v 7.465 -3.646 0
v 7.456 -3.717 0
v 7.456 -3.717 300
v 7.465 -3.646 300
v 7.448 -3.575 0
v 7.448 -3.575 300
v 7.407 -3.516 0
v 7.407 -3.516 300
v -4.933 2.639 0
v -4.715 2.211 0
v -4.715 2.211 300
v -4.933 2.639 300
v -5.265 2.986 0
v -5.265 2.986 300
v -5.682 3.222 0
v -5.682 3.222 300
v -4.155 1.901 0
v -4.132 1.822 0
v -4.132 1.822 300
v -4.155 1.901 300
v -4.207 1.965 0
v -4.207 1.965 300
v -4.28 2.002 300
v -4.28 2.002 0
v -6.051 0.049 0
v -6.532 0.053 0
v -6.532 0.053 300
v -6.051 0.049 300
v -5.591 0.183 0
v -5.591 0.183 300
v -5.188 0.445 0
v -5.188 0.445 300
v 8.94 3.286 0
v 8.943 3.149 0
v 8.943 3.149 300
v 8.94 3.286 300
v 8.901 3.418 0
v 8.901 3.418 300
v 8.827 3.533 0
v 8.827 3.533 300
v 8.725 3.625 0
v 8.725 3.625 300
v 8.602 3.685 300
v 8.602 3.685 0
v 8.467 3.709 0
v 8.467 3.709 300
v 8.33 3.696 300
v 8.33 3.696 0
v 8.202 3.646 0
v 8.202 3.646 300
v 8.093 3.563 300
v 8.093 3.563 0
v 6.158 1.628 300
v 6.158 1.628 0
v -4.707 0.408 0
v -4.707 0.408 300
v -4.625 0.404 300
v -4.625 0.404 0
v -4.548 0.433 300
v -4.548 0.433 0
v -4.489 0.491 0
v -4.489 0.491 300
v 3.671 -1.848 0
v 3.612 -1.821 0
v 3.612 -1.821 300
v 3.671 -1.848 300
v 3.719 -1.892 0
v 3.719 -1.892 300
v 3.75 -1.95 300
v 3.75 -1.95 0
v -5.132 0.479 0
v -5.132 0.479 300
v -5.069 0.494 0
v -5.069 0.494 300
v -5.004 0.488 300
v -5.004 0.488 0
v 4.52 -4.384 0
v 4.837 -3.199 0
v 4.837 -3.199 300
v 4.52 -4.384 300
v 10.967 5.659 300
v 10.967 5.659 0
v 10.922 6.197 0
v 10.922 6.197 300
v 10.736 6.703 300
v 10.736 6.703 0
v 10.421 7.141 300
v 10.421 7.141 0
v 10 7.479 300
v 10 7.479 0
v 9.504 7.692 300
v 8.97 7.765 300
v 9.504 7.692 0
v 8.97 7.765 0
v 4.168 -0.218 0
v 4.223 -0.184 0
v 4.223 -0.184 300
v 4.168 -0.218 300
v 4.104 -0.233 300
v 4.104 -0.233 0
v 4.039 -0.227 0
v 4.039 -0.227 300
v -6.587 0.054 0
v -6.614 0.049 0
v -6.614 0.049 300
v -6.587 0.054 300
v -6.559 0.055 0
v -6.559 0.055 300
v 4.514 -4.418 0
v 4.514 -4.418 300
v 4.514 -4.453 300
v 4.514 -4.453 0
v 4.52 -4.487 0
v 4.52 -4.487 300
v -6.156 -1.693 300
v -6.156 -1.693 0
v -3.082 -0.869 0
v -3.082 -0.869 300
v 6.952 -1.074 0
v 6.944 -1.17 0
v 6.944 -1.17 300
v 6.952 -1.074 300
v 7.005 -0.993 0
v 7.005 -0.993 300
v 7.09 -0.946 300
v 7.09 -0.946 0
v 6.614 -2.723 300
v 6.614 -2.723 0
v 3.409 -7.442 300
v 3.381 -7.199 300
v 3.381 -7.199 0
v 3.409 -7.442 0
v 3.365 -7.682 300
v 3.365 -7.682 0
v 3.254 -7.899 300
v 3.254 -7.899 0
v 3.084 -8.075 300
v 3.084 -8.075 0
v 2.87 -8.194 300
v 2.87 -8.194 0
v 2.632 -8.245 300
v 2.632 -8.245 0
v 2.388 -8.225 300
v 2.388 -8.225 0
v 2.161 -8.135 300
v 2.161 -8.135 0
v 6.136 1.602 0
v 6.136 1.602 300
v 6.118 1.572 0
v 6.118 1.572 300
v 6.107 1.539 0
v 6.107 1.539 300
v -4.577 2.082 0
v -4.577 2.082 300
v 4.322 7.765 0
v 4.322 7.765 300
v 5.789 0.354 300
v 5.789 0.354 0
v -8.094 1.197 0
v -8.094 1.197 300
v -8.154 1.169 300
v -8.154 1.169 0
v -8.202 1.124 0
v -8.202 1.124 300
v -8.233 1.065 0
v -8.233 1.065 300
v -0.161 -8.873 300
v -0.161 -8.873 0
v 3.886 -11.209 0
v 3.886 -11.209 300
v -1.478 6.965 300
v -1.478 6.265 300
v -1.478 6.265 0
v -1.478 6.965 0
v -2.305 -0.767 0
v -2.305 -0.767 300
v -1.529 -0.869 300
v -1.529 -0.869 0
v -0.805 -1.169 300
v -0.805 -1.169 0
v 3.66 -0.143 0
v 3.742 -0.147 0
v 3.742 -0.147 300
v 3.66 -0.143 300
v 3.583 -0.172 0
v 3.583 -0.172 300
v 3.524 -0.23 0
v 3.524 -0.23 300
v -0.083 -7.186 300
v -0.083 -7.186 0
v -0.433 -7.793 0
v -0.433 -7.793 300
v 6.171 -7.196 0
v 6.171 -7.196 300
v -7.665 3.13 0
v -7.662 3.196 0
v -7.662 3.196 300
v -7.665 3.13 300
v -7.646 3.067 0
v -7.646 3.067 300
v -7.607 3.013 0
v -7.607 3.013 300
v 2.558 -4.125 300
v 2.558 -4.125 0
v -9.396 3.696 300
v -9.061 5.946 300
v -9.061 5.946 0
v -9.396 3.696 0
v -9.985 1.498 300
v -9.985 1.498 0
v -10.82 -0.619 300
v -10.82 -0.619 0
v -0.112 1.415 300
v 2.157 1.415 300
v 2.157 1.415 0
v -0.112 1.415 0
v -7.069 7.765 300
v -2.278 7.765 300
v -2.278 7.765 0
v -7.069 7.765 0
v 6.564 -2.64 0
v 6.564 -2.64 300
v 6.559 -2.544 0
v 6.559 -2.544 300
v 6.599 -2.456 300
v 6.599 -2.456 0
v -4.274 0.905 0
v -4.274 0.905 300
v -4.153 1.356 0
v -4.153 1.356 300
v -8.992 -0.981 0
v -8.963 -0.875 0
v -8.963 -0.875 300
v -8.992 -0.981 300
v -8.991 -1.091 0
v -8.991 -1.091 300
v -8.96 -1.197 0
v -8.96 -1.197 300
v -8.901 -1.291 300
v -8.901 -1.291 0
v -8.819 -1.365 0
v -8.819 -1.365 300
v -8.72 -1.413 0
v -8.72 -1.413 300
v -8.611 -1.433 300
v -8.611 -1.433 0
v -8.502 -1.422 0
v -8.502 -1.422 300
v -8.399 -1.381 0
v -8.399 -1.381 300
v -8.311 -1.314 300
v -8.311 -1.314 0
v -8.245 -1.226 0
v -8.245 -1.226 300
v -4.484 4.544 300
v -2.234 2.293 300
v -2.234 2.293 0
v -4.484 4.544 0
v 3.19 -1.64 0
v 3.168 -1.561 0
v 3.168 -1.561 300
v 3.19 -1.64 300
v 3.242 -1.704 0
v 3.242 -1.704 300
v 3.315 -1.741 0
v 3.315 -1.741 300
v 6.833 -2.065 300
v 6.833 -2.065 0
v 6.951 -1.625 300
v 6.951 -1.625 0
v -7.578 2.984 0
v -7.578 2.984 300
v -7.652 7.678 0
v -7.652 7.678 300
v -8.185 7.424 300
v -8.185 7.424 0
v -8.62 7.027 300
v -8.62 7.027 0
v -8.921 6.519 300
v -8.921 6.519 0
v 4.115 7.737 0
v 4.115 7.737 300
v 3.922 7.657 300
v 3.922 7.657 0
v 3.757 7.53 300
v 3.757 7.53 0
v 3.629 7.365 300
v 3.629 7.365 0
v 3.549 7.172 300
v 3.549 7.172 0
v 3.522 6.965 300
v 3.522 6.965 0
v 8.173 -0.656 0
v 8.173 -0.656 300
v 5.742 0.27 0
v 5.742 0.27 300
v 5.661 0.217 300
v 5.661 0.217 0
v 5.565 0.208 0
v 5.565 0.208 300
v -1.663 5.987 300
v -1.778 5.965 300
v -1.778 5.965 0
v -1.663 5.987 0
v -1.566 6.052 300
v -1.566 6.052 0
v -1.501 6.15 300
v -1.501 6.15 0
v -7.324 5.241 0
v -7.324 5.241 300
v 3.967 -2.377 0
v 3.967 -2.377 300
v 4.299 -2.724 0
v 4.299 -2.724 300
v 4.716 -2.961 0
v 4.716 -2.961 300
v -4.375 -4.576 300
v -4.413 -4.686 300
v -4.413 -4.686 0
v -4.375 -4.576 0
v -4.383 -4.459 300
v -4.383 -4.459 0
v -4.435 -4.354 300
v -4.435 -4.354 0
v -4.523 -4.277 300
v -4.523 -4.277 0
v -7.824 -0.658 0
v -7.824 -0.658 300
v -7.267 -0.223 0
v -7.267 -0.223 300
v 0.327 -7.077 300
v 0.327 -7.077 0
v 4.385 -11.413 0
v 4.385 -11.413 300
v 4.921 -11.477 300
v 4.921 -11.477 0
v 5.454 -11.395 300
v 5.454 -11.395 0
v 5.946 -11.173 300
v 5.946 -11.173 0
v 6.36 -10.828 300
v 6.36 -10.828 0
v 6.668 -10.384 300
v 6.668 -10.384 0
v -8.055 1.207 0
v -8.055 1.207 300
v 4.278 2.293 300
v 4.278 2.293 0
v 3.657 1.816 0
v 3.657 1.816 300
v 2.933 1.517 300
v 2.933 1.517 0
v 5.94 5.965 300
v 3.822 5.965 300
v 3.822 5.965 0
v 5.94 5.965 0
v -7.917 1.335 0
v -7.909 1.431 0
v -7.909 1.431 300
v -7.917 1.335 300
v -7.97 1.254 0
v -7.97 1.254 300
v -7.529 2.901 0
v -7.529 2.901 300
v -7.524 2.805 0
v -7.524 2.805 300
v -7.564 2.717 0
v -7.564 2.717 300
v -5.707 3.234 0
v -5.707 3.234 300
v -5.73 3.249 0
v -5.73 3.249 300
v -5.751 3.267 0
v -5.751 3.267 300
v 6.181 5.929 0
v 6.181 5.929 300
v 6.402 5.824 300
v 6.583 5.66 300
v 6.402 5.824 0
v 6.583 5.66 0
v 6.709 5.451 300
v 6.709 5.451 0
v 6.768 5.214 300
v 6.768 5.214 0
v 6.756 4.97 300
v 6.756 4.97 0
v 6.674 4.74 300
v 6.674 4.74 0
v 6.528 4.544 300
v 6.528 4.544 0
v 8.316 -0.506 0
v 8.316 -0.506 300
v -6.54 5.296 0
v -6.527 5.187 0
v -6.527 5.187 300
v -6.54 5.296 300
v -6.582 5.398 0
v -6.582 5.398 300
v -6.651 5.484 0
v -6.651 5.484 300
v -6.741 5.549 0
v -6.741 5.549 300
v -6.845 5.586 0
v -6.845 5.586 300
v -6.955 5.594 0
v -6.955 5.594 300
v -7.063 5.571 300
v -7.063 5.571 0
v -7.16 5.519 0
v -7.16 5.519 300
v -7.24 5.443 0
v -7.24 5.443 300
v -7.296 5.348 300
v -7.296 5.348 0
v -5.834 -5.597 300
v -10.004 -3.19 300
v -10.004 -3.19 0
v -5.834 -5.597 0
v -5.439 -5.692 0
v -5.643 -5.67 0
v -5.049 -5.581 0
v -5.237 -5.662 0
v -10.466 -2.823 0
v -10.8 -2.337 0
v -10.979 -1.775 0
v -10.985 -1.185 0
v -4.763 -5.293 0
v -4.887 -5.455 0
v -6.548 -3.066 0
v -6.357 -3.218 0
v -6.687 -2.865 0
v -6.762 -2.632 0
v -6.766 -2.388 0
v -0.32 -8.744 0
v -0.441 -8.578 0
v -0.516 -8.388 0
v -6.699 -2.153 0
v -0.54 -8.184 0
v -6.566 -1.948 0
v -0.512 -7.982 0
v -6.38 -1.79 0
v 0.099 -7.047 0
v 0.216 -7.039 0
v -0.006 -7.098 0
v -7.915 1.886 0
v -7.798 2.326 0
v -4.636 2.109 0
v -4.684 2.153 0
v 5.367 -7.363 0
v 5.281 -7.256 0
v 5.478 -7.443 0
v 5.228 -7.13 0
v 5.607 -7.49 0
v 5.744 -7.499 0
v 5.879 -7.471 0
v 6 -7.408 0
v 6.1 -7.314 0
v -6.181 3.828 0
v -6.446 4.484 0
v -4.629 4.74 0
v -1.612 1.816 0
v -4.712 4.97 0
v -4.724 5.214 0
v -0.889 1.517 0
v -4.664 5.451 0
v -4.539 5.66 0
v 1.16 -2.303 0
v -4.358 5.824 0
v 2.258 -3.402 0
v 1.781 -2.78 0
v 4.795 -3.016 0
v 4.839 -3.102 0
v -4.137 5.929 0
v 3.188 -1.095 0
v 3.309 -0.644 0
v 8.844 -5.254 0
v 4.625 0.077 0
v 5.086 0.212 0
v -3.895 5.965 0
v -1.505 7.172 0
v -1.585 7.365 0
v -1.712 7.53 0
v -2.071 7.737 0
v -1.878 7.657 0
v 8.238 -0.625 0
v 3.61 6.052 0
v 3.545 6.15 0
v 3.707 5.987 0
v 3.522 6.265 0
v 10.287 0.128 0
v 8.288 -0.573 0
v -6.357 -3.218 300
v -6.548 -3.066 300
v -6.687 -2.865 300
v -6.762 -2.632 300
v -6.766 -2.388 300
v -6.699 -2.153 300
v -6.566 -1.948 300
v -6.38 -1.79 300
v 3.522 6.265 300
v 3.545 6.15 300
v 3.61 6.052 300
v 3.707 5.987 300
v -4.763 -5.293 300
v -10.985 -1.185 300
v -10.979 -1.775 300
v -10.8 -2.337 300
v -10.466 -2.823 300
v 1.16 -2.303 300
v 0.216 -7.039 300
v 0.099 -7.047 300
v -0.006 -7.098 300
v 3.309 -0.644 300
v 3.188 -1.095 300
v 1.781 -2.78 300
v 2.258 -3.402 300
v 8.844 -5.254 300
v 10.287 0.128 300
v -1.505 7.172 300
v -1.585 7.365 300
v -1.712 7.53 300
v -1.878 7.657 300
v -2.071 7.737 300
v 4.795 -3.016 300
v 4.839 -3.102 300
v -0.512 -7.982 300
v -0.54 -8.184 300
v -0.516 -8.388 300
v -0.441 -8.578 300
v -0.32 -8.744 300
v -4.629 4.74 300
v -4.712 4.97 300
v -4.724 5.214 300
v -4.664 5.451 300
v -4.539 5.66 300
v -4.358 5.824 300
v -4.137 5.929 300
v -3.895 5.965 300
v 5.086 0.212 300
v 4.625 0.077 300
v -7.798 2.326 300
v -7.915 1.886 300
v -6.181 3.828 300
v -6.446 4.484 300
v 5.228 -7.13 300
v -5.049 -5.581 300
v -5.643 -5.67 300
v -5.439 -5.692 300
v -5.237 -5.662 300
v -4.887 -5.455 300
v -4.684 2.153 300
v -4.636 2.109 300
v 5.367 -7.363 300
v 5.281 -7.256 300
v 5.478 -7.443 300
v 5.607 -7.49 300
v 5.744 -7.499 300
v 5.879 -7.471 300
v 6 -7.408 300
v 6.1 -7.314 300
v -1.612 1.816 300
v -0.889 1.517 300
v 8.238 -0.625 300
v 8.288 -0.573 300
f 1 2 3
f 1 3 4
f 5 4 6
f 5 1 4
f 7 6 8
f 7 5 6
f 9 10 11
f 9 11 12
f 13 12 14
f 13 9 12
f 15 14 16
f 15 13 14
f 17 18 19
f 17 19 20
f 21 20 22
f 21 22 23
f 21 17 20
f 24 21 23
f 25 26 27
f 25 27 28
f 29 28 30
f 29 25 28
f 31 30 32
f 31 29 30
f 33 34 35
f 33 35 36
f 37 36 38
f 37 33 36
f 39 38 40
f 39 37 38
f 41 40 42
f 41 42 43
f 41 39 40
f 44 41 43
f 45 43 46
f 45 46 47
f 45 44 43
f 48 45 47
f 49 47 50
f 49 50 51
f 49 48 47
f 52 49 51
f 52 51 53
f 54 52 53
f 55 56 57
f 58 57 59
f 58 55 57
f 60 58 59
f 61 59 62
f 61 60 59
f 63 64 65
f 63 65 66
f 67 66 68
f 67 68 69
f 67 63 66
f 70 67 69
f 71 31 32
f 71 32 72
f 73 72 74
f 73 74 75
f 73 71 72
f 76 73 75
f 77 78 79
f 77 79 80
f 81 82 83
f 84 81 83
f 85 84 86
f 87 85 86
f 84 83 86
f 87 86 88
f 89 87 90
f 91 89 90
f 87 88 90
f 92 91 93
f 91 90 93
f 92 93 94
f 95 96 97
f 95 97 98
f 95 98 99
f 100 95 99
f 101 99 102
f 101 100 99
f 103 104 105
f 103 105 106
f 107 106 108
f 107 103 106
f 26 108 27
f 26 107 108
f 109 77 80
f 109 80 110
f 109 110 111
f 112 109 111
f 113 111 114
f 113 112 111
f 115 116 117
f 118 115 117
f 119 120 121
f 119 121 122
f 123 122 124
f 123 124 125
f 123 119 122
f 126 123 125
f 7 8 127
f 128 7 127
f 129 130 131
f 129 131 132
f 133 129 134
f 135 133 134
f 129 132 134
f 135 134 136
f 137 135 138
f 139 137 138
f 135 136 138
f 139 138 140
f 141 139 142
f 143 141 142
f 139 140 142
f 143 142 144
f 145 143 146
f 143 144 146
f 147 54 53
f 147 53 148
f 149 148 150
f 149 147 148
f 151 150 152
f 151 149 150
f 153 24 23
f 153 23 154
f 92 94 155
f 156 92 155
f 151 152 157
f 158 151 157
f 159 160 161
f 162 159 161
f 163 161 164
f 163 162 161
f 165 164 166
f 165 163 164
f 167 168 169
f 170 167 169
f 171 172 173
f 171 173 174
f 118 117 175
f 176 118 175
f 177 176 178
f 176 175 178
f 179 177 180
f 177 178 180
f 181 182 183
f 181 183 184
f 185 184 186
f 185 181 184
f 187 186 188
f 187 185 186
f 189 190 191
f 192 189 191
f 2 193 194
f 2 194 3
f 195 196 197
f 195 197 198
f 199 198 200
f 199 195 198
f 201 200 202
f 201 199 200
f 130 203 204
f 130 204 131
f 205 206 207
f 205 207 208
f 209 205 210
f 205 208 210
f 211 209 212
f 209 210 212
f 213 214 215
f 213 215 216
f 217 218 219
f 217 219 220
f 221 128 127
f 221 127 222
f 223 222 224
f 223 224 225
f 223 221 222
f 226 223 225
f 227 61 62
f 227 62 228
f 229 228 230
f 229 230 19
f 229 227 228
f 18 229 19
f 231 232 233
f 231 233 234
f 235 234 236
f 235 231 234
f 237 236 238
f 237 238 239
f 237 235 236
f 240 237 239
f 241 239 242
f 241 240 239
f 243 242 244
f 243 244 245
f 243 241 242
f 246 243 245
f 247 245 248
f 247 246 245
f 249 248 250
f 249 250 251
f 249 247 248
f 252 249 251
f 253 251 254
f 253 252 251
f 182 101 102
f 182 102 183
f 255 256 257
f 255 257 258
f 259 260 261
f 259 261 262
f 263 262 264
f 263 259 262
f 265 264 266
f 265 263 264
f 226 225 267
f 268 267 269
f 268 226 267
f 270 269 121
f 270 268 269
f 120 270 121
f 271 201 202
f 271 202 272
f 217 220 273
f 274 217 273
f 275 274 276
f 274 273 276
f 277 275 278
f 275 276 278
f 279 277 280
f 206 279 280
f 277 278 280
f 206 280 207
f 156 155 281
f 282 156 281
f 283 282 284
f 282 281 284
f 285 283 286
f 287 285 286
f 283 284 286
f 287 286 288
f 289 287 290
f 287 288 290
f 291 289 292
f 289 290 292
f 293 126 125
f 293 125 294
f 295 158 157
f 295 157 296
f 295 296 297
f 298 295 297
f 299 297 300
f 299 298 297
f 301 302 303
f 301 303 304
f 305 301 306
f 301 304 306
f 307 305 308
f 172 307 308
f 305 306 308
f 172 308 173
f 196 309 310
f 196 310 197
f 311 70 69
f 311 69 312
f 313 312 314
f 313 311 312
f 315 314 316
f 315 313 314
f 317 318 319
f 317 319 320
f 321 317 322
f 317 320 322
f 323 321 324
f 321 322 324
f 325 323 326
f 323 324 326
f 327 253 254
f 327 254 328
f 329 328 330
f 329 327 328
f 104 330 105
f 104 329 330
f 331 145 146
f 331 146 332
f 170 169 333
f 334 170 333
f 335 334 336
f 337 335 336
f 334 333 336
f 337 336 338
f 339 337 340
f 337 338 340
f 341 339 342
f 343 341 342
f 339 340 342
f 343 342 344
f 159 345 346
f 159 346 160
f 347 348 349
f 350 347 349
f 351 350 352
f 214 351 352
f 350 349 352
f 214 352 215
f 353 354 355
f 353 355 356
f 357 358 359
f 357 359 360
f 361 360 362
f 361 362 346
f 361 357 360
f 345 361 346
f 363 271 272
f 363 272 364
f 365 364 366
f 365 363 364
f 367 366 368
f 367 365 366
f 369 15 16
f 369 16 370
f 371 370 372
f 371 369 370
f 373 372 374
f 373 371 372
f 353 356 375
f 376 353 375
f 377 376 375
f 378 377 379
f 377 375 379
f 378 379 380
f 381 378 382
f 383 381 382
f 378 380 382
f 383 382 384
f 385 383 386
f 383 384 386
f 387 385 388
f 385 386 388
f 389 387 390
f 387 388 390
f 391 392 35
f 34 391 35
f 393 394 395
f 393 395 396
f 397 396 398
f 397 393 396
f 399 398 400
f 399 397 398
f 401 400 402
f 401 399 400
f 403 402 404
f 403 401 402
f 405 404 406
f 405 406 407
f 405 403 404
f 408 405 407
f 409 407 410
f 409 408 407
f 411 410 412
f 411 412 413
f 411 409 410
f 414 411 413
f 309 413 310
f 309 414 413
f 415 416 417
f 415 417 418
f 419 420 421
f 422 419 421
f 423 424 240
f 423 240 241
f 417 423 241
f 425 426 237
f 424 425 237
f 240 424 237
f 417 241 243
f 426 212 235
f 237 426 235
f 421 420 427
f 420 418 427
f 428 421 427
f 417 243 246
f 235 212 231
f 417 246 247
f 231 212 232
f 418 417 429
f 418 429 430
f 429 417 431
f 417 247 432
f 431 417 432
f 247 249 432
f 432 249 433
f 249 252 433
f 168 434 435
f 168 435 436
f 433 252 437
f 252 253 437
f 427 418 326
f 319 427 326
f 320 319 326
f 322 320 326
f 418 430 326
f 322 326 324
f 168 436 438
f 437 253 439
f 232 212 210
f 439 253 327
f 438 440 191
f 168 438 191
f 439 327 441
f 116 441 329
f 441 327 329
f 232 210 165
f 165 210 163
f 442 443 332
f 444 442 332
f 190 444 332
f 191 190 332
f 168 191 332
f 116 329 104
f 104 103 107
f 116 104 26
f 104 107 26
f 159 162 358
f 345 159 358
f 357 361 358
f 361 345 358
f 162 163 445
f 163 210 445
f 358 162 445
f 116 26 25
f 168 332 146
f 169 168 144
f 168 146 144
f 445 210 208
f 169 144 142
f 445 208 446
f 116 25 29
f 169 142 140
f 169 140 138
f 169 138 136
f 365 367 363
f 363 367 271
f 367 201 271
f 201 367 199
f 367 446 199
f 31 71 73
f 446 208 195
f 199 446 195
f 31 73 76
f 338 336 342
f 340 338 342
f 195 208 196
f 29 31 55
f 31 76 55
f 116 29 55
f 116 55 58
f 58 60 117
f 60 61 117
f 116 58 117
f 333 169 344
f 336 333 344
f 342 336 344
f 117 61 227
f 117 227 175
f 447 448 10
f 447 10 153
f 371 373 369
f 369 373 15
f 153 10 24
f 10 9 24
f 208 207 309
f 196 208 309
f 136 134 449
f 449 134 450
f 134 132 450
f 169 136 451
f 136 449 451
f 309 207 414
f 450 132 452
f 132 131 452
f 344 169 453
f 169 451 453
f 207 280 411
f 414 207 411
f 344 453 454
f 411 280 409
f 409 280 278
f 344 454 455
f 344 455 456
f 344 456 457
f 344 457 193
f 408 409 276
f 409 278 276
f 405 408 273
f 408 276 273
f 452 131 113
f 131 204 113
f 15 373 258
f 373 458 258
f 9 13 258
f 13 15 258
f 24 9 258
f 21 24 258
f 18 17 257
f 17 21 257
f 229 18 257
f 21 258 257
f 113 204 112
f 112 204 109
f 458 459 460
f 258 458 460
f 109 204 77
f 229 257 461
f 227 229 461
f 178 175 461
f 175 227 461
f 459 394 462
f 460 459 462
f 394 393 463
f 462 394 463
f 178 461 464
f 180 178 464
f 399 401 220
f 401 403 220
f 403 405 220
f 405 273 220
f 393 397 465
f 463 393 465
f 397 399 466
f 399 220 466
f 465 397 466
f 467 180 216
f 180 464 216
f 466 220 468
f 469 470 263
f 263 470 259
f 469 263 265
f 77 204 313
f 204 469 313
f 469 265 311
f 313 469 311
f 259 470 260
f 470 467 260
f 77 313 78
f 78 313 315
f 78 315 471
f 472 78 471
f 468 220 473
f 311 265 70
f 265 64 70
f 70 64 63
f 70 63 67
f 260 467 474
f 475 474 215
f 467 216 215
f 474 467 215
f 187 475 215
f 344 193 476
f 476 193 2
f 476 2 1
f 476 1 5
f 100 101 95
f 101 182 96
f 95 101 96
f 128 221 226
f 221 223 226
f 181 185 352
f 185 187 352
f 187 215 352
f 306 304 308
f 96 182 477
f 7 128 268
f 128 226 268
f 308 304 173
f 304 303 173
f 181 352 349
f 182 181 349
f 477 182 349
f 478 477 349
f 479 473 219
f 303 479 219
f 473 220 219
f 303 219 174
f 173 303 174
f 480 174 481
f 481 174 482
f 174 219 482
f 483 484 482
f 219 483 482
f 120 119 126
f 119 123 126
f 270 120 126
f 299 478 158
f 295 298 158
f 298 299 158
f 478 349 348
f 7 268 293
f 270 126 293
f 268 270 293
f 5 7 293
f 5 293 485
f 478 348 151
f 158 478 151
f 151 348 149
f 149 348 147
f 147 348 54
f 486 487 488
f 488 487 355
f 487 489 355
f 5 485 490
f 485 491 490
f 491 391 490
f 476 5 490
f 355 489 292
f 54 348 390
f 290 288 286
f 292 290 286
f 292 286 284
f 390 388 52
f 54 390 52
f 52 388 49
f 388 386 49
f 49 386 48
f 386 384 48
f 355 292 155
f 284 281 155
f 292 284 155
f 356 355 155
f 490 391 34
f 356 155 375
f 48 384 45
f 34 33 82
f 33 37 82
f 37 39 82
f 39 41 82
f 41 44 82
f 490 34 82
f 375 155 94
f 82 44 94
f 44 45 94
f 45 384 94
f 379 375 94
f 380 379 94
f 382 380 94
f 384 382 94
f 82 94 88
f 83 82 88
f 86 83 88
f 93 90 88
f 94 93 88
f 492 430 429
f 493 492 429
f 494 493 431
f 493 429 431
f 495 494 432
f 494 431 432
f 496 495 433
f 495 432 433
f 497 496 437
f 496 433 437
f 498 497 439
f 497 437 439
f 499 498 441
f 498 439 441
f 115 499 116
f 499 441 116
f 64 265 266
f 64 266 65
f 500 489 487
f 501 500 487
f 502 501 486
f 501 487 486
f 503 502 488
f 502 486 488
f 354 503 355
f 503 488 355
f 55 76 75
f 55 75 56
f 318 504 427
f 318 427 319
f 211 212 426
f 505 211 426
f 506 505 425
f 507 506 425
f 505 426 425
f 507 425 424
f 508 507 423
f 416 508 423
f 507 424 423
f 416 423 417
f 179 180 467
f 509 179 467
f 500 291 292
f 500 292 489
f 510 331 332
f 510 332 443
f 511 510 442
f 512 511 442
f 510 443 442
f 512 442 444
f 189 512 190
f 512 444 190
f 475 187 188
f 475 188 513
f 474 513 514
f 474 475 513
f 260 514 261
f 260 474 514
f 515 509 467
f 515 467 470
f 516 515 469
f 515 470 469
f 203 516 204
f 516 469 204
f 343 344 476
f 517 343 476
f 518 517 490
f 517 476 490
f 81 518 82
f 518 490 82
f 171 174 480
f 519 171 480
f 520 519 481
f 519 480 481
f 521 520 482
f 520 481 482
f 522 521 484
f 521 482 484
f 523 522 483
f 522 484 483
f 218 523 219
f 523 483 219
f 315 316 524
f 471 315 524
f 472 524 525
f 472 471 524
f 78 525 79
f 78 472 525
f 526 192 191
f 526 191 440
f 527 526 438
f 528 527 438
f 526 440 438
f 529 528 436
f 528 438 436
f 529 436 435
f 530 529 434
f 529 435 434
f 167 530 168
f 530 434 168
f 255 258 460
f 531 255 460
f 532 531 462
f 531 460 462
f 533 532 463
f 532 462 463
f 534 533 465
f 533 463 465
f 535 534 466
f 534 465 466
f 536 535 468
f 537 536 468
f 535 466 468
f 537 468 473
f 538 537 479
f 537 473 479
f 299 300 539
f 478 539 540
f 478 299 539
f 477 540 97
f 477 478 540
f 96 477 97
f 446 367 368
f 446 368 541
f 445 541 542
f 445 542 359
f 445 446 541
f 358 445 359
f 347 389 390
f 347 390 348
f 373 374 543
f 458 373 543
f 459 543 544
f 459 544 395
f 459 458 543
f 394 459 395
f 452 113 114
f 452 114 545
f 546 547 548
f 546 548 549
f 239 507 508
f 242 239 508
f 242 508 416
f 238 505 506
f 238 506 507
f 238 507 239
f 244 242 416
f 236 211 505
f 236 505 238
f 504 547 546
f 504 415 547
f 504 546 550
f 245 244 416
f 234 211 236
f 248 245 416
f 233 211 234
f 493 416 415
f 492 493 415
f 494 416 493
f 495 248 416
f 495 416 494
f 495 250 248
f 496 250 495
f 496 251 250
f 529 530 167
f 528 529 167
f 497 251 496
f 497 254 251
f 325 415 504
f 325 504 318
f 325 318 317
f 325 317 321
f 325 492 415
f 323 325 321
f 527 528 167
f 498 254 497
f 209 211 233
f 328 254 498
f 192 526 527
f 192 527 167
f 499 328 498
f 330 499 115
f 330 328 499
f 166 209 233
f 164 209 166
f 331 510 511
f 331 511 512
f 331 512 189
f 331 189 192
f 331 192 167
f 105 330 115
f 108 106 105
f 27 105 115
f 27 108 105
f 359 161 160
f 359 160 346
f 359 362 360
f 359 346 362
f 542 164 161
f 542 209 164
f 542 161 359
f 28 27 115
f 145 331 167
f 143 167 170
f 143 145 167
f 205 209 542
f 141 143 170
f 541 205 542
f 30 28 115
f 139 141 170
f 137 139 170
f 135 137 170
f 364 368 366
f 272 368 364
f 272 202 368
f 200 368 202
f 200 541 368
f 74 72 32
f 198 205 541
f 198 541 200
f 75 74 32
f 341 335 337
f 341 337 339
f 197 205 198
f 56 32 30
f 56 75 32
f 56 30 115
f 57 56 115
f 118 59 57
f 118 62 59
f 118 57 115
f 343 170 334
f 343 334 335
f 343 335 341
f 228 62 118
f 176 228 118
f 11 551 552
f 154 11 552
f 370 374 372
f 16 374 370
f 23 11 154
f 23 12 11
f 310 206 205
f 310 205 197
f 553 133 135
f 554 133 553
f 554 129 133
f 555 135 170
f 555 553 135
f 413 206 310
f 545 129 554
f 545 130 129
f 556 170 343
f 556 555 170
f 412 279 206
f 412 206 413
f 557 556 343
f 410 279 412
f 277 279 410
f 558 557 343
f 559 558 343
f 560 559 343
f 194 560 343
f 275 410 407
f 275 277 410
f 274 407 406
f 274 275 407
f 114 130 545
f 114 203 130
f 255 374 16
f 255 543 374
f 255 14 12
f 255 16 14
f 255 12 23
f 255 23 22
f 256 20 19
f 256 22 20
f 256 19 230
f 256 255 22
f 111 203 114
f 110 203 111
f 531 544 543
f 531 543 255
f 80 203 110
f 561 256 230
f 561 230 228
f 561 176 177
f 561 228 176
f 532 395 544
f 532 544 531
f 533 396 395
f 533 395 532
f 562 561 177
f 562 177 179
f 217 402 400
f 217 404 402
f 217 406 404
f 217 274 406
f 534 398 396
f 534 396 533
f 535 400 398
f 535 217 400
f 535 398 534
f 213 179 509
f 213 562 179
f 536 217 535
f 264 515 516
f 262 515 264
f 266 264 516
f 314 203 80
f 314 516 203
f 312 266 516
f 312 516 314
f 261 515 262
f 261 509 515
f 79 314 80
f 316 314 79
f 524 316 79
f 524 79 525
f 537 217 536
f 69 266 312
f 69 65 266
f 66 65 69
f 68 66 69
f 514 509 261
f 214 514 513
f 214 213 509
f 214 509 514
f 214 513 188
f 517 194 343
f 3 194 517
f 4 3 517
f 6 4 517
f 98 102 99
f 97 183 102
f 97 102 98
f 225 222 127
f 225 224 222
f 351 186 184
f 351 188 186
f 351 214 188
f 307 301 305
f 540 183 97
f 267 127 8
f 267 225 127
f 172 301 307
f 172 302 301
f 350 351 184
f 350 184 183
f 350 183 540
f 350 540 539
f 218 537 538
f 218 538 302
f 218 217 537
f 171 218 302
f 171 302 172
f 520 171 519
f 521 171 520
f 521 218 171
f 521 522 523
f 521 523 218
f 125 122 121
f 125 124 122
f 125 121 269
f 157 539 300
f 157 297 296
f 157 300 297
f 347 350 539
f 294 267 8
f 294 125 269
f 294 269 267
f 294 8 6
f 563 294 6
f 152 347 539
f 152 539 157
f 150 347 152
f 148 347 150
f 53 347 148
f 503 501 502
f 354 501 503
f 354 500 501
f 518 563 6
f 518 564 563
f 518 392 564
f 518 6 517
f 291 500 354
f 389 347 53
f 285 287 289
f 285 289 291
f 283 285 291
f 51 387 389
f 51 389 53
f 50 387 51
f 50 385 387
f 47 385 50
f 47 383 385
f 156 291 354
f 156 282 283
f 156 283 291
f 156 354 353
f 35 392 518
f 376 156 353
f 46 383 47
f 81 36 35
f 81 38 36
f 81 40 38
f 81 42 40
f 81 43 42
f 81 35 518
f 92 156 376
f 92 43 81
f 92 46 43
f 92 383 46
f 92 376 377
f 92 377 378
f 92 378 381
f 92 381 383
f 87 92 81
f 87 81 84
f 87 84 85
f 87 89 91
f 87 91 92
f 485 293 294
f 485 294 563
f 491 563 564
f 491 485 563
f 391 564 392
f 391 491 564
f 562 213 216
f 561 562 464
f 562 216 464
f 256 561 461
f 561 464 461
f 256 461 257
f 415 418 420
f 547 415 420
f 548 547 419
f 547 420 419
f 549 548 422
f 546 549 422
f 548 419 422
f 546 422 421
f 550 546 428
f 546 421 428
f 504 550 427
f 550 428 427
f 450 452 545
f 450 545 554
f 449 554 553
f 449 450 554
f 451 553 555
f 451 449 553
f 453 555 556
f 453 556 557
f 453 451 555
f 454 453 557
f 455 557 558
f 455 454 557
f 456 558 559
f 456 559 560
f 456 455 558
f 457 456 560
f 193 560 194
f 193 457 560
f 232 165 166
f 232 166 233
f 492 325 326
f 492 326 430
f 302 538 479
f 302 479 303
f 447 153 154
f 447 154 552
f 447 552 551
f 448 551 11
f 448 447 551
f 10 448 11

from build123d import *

# Parameters (mm, degrees)
BOSS_EXTRU_1_DEPTH = 300


with BuildPart() as part:
    # Esquisse1 → Boss.-Extru.1 (new body)
    with BuildSketch(Plane.XY):
        with BuildLine():
            Line((-2.277781394, 7.764570671), (-7.068879094, 7.764570671))
            ThreePointArc((-7.068879094, 7.764570671), (-8.417278819, 7.241668562), (-9.060597485, 5.946388851))
            ThreePointArc((-9.060597485, 5.946388851), (-9.659264868, 2.58818977), (-10.819903246, -0.619429637))
            ThreePointArc((-10.819903246, -0.619429637), (-10.910412794, -2.062834106), (-10.00411543, -3.18988048))
            Line((-10.00411543, -3.18988048), (-5.834093414, -5.597443814))
            ThreePointArc((-5.834093414, -5.597443814), (-5.236709364, -5.662062276), (-4.7628449, -5.292609007))
            Line((-4.7628449, -5.292609007), (-4.412844891, -4.68639123))
            ThreePointArc((-4.412844891, -4.68639123), (-4.382874764, -4.458745516), (-4.522652512, -4.276583608))
            Line((-4.522652512, -4.276583608), (-6.356537861, -3.217789408))
            ThreePointArc((-6.356537861, -3.217789408), (-6.765622267, -2.388248296), (-6.155776036, -1.692851946))
            Line((-6.155776036, -1.692851946), (-3.081802459, -0.869183204))
            ThreePointArc((-3.081802459, -0.869183204), (-1.913766747, -0.792626099), (-0.805345324, -1.168884471))
            Line((-0.805345324, -1.168884471), (1.159782546, -2.303451576))
            ThreePointArc((1.159782546, -2.303451576), (2.039842566, -3.075243499), (2.557560023, -4.125070649))
            Line((2.557560023, -4.125070649), (3.381228766, -7.199044225))
            ThreePointArc((3.381228766, -7.199044225), (3.083920975, -8.074884735), (2.160975089, -8.135377804))
            Line((2.160975089, -8.135377804), (0.32708974, -7.076583604))
            ThreePointArc((0.32708974, -7.076583604), (0.099444026, -7.046613477), (-0.082717881, -7.186391225))
            Line((-0.082717881, -7.186391225), (-0.432717881, -7.792609008))
            ThreePointArc((-0.432717881, -7.792609008), (-0.515741566, -8.3877143), (-0.161088322, -8.872754831))
            Line((-0.161088322, -8.872754831), (3.885572059, -11.209095291))
            ThreePointArc((3.885572059, -11.209095291), (5.453886583, -11.394599855), (6.667853821, -10.384497912))
            ThreePointArc((6.667853821, -10.384497912), (9.659251661, -2.588191136), (10.966778527, 5.659307508))
            ThreePointArc((10.966778527, 5.659307508), (10.420503025, 7.141065072), (8.969550516, 7.764570662))
            Line((8.969550516, 7.764570662), (4.322218596, 7.764570662))
            ThreePointArc((4.322218596, 7.764570662), (3.756533171, 7.530256087), (3.522218596, 6.964570662))
            Line((3.522218596, 6.964570662), (3.522218596, 6.264570662))
            ThreePointArc((3.522218596, 6.264570662), (3.610086561, 6.052438628), (3.822218596, 5.964570662))
            Line((3.822218596, 5.964570662), (5.939806996, 5.964570662))
            ThreePointArc((5.939806996, 5.964570662), (6.708855039, 5.450709188), (6.528410886, 4.543555168))
            Line((6.528410886, 4.543555168), (4.278106046, 2.293250328))
            ThreePointArc((4.278106046, 2.293250328), (3.304835999, 1.642932074), (2.156785702, 1.414570672))
            Line((2.156785702, 1.414570672), (-0.112348508, 1.414570672))
            ThreePointArc((-0.112348508, 1.414570672), (-1.260398803, 1.642932074), (-2.233668848, 2.293250327))
            Line((-2.233668848, 2.293250327), (-4.483973688, 4.543555167))
            ThreePointArc((-4.483973688, 4.543555167), (-4.664417843, 5.450709193), (-3.895369794, 5.964570671))
            Line((-3.895369794, 5.964570671), (-1.777781394, 5.964570671))
            ThreePointArc((-1.777781394, 5.964570671), (-1.565649359, 6.052438637), (-1.477781394, 6.264570671))
            Line((-1.477781394, 6.264570671), (-1.477781394, 6.964570671))
            ThreePointArc((-1.477781394, 6.964570671), (-1.712095969, 7.530256096), (-2.277781394, 7.764570671))
        make_face()
        with BuildLine():
            Line((-7.323961592, 5.240984459), (-7.661560194, 3.19617001))
            ThreePointArc((-7.661560194, 3.19617001), (-7.657816372, 3.097611471), (-7.607424532, 3.012826659))
            Line((-7.607424532, 3.012826659), (-7.57849861, 2.983900741))
            ThreePointArc((-7.57849861, 2.983900741), (-7.520213219, 2.853306067), (-7.56403866, 2.717175664))
            ThreePointArc((-7.56403866, 2.717175664), (-7.87179554, 2.110471478), (-7.908622362, 1.431171801))
            ThreePointArc((-7.908622362, 1.431171801), (-7.938733618, 1.291366699), (-8.05450758, 1.20741109))
            Line((-8.05450758, 1.20741109), (-8.094021121, 1.196823472))
            ThreePointArc((-8.094021121, 1.196823472), (-8.180054139, 1.148593589), (-8.23257565, 1.0651113))
            Line((-8.23257565, 1.0651113), (-8.962613913, -0.874549263))
            ThreePointArc((-8.962613913, -0.874549263), (-8.771314591, -1.392312789), (-8.244983453, -1.226029799))
            ThreePointArc((-8.244983453, -1.226029799), (-7.559869341, -0.421536961), (-6.6135889, 0.048721903))
            ThreePointArc((-6.6135889, 0.048721903), (-6.572819287, 0.055124525), (-6.531603527, 0.053023068))
            ThreePointArc((-6.531603527, 0.053023068), (-5.816110839, 0.099392966), (-5.18783842, 0.444869046))
            ThreePointArc((-5.18783842, 0.444869046), (-5.101288158, 0.489475582), (-5.003931638, 0.487926814))
            Line((-5.003931638, 0.487926814), (-4.707356797, 0.408459826))
            ThreePointArc((-4.707356797, 0.408459826), (-4.585051414, 0.414498293), (-4.489190426, 0.490693704))
            ThreePointArc((-4.489190426, 0.490693704), (-4.201277401, 1.126959114), (-4.132484687, 1.821937635))
            ThreePointArc((-4.132484687, 1.821937635), (-4.177405034, 1.935855289), (-4.280305369, 2.002237445))
            Line((-4.280305369, 2.002237445), (-4.576880211, 2.081704429))
            ThreePointArc((-4.576880211, 2.081704429), (-4.661967815, 2.129041419), (-4.714619271, 2.210946946))
            ThreePointArc((-4.714619271, 2.210946946), (-5.085981109, 2.82427422), (-5.682431007, 3.222178075))
            ThreePointArc((-5.682431007, 3.222178075), (-5.719175628, 3.240966039), (-5.751281836, 3.266895679))
            ThreePointArc((-5.751281836, 3.266895679), (-6.335655302, 4.147292021), (-6.526735107, 5.186560309))
            ThreePointArc((-6.526735107, 5.186560309), (-6.899409756, 5.593731171), (-7.323961592, 5.240984459))
        make_face(mode=Mode.SUBTRACT)
        with BuildLine():
            Line((4.039005672, -0.226915238), (3.742430831, -0.147448251))
            ThreePointArc((3.742430831, -0.147448251), (3.620125447, -0.153486718), (3.524264457, -0.22968213))
            ThreePointArc((3.524264457, -0.22968213), (3.236351435, -0.865947537), (3.167558721, -1.560926054))
            ThreePointArc((3.167558721, -1.560926054), (3.212479068, -1.674843705), (3.3153794, -1.74122586))
            Line((3.3153794, -1.74122586), (3.611954241, -1.820692845))
            ThreePointArc((3.611954241, -1.820692845), (3.697041845, -1.868029834), (3.749693301, -1.949935361))
            ThreePointArc((3.749693301, -1.949935361), (4.120587374, -2.562773684), (4.716243148, -2.960677472))
            ThreePointArc((4.716243148, -2.960677472), (4.822262289, -3.056657136), (4.837082998, -3.198898132))
            Line((4.837082998, -3.198898132), (4.519637838, -4.383619602))
            ThreePointArc((4.519637838, -4.383619602), (4.512823004, -4.435383412), (4.519637838, -4.487147222))
            Line((4.519637838, -4.487147222), (5.227723978, -7.129760649))
            ThreePointArc((5.227723978, -7.129760649), (5.675553803, -7.499115267), (6.170739428, -7.196186922))
            Line((6.170739428, -7.196186922), (7.455923223, -3.717453783))
            ThreePointArc((7.455923223, -3.717453783), (7.459439401, -3.609785311), (7.406594848, -3.515911372))
            Line((7.406594848, -3.515911372), (6.613572648, -2.722889172))
            ThreePointArc((6.613572648, -2.722889172), (6.555287263, -2.592294501), (6.599112704, -2.456164105))
            ThreePointArc((6.599112704, -2.456164105), (6.906869584, -1.849459918), (6.943696406, -1.170160238))
            ThreePointArc((6.943696406, -1.170160238), (6.973807663, -1.030355137), (7.089581623, -0.946399529))
            Line((7.089581623, -0.946399529), (8.172870105, -0.656133266))
            ThreePointArc((8.172870105, -0.656133266), (8.2655718, -0.601258323), (8.316360933, -0.506256599))
            Line((8.316360933, -0.506256599), (8.942725678, 3.149006571))
            ThreePointArc((8.942725678, 3.149006571), (8.665346523, 3.658943048), (8.092837193, 3.56298747))
            Line((8.092837193, 3.56298747), (6.158309903, 1.62846018))
            ThreePointArc((6.158309903, 1.62846018), (6.126526177, 1.587038823), (6.106546092, 1.53880263))
            Line((6.106546092, 1.53880263), (5.789100936, 0.35408116))
            ThreePointArc((5.789100936, 0.35408116), (5.705145325, 0.238307201), (5.565340223, 0.208195951))
            ThreePointArc((5.565340223, 0.208195951), (4.850535301, 0.161429048), (4.222912453, -0.18385747))
            ThreePointArc((4.222912453, -0.18385747), (4.136362192, -0.228464006), (4.039005672, -0.226915238))
        make_face(mode=Mode.SUBTRACT)
    extrude(amount=BOSS_EXTRU_1_DEPTH)


solid = part.part
